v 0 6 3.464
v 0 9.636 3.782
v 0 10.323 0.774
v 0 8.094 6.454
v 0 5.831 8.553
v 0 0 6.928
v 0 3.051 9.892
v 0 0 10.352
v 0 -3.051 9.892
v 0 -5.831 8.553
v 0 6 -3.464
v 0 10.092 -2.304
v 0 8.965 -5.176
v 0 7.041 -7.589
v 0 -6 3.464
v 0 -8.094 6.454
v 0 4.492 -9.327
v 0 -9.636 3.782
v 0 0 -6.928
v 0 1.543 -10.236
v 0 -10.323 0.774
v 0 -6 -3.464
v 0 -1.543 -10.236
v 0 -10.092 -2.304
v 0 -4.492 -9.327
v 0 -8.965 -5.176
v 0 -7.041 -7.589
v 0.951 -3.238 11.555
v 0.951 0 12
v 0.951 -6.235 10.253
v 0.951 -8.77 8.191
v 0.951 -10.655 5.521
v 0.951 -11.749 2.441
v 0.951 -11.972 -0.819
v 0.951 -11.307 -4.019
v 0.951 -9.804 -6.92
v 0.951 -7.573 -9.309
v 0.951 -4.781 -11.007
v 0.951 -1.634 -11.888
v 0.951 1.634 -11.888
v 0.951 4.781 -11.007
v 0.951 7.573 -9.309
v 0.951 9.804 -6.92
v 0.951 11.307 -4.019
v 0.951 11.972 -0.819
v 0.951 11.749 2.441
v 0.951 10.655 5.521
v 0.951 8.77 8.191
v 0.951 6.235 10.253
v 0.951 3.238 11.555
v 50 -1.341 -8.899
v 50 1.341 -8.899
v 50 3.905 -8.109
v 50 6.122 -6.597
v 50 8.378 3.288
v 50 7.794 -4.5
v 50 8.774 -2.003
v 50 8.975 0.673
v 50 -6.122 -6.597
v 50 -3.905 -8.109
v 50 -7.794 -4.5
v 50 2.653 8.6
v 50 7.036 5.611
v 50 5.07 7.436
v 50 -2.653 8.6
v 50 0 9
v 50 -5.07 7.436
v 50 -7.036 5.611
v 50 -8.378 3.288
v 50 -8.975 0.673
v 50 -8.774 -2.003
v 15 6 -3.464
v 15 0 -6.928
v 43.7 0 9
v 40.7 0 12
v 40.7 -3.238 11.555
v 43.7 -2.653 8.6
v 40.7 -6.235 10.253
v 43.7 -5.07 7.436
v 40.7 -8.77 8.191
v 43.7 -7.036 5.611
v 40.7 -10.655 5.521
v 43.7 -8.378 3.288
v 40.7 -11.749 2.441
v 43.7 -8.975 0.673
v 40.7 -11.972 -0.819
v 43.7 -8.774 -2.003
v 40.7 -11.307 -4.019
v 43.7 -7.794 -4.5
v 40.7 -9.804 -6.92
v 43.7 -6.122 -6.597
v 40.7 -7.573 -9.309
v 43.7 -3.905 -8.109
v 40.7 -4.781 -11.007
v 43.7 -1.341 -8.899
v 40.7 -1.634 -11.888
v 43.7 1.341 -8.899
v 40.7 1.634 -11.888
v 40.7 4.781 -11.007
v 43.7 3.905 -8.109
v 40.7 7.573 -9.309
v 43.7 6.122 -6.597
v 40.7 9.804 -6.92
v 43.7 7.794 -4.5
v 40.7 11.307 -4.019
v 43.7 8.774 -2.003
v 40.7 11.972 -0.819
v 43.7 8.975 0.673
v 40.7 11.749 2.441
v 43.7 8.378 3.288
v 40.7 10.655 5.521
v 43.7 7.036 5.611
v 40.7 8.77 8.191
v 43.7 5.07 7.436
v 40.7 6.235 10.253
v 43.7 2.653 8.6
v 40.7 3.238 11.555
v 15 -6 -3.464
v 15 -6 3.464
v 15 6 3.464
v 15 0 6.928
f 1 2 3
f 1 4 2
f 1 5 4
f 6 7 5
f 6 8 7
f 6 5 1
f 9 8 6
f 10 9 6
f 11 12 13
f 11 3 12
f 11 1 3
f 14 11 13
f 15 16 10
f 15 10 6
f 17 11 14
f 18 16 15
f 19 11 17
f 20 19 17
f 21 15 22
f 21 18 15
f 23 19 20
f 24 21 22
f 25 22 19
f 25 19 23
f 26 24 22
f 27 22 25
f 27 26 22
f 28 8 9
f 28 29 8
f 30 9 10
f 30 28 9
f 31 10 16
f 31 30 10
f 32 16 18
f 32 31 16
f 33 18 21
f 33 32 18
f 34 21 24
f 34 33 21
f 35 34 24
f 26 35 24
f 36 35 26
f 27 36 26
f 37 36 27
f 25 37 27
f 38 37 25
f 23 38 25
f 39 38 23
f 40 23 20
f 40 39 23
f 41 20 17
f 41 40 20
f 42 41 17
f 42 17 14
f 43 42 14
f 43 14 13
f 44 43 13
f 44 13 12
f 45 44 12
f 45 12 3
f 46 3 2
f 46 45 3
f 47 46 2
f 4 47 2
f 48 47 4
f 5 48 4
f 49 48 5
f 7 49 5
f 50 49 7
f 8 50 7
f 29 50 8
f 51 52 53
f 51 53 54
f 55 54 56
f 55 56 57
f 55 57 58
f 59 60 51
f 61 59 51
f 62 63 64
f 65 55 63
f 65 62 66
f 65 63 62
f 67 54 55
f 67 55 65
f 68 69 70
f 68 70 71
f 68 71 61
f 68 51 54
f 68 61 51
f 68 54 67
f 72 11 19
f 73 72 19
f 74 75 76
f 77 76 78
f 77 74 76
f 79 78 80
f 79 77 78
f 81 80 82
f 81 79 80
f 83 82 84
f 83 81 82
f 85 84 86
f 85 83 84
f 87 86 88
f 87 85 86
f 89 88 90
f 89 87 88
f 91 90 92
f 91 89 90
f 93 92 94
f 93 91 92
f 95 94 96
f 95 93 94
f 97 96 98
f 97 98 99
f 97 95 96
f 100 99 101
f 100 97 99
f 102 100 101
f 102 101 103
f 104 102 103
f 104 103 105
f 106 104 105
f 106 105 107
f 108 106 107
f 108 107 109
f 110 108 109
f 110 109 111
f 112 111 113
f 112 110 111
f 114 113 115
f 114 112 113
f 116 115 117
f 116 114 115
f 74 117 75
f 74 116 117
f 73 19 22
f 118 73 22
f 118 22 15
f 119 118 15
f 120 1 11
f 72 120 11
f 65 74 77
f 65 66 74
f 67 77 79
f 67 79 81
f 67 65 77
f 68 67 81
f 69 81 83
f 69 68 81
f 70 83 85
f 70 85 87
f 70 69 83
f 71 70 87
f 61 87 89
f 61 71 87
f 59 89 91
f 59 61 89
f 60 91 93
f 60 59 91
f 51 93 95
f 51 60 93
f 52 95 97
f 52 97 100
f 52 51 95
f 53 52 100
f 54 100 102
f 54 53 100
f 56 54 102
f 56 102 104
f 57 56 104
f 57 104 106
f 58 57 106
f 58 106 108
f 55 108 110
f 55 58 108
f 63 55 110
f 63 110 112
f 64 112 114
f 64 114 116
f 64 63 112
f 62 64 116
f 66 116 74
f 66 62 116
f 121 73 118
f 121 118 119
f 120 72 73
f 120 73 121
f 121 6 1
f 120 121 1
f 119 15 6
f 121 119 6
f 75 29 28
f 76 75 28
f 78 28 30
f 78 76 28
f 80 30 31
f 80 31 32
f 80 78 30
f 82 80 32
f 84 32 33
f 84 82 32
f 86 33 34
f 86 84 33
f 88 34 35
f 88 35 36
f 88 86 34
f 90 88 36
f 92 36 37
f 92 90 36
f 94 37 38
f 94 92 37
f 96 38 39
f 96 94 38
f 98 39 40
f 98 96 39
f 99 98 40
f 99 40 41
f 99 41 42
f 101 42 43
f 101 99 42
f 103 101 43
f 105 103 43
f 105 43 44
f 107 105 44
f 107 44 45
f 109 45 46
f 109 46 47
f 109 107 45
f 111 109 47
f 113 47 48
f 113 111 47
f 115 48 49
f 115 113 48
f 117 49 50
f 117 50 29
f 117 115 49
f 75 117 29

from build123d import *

# Parameters (mm, degrees)
HEX_2_DEPTH = 15


with BuildPart() as part:
    # BodySke → BaseBody (revolve)
    with BuildSketch(Plane.XY, mode=Mode.PRIVATE) as basebody_sk:
        Polygon((0, 0), (0, 10.352), (0.951473244, 12), (40.7, 12), (43.7, 9), (50, 9), (50, 0), align=None)
    revolve(basebody_sk.sketch.rotate(Axis((-12.7, 0, 0), (1, 0, 0)), 90), axis=Axis((-12.7, 0, 0), (1, 0, 0)))

    # Sketch2 → Hex 2 (cut)
    with BuildSketch(Plane.ZY):
        Polygon((3.464101615, 6), (-3.464101615, 6), (-6.92820323, 0), (-3.464101615, -6), (3.464101615, -6), (6.92820323, 0), align=None)
    extrude(amount=-HEX_2_DEPTH, mode=Mode.SUBTRACT)


solid = part.part
